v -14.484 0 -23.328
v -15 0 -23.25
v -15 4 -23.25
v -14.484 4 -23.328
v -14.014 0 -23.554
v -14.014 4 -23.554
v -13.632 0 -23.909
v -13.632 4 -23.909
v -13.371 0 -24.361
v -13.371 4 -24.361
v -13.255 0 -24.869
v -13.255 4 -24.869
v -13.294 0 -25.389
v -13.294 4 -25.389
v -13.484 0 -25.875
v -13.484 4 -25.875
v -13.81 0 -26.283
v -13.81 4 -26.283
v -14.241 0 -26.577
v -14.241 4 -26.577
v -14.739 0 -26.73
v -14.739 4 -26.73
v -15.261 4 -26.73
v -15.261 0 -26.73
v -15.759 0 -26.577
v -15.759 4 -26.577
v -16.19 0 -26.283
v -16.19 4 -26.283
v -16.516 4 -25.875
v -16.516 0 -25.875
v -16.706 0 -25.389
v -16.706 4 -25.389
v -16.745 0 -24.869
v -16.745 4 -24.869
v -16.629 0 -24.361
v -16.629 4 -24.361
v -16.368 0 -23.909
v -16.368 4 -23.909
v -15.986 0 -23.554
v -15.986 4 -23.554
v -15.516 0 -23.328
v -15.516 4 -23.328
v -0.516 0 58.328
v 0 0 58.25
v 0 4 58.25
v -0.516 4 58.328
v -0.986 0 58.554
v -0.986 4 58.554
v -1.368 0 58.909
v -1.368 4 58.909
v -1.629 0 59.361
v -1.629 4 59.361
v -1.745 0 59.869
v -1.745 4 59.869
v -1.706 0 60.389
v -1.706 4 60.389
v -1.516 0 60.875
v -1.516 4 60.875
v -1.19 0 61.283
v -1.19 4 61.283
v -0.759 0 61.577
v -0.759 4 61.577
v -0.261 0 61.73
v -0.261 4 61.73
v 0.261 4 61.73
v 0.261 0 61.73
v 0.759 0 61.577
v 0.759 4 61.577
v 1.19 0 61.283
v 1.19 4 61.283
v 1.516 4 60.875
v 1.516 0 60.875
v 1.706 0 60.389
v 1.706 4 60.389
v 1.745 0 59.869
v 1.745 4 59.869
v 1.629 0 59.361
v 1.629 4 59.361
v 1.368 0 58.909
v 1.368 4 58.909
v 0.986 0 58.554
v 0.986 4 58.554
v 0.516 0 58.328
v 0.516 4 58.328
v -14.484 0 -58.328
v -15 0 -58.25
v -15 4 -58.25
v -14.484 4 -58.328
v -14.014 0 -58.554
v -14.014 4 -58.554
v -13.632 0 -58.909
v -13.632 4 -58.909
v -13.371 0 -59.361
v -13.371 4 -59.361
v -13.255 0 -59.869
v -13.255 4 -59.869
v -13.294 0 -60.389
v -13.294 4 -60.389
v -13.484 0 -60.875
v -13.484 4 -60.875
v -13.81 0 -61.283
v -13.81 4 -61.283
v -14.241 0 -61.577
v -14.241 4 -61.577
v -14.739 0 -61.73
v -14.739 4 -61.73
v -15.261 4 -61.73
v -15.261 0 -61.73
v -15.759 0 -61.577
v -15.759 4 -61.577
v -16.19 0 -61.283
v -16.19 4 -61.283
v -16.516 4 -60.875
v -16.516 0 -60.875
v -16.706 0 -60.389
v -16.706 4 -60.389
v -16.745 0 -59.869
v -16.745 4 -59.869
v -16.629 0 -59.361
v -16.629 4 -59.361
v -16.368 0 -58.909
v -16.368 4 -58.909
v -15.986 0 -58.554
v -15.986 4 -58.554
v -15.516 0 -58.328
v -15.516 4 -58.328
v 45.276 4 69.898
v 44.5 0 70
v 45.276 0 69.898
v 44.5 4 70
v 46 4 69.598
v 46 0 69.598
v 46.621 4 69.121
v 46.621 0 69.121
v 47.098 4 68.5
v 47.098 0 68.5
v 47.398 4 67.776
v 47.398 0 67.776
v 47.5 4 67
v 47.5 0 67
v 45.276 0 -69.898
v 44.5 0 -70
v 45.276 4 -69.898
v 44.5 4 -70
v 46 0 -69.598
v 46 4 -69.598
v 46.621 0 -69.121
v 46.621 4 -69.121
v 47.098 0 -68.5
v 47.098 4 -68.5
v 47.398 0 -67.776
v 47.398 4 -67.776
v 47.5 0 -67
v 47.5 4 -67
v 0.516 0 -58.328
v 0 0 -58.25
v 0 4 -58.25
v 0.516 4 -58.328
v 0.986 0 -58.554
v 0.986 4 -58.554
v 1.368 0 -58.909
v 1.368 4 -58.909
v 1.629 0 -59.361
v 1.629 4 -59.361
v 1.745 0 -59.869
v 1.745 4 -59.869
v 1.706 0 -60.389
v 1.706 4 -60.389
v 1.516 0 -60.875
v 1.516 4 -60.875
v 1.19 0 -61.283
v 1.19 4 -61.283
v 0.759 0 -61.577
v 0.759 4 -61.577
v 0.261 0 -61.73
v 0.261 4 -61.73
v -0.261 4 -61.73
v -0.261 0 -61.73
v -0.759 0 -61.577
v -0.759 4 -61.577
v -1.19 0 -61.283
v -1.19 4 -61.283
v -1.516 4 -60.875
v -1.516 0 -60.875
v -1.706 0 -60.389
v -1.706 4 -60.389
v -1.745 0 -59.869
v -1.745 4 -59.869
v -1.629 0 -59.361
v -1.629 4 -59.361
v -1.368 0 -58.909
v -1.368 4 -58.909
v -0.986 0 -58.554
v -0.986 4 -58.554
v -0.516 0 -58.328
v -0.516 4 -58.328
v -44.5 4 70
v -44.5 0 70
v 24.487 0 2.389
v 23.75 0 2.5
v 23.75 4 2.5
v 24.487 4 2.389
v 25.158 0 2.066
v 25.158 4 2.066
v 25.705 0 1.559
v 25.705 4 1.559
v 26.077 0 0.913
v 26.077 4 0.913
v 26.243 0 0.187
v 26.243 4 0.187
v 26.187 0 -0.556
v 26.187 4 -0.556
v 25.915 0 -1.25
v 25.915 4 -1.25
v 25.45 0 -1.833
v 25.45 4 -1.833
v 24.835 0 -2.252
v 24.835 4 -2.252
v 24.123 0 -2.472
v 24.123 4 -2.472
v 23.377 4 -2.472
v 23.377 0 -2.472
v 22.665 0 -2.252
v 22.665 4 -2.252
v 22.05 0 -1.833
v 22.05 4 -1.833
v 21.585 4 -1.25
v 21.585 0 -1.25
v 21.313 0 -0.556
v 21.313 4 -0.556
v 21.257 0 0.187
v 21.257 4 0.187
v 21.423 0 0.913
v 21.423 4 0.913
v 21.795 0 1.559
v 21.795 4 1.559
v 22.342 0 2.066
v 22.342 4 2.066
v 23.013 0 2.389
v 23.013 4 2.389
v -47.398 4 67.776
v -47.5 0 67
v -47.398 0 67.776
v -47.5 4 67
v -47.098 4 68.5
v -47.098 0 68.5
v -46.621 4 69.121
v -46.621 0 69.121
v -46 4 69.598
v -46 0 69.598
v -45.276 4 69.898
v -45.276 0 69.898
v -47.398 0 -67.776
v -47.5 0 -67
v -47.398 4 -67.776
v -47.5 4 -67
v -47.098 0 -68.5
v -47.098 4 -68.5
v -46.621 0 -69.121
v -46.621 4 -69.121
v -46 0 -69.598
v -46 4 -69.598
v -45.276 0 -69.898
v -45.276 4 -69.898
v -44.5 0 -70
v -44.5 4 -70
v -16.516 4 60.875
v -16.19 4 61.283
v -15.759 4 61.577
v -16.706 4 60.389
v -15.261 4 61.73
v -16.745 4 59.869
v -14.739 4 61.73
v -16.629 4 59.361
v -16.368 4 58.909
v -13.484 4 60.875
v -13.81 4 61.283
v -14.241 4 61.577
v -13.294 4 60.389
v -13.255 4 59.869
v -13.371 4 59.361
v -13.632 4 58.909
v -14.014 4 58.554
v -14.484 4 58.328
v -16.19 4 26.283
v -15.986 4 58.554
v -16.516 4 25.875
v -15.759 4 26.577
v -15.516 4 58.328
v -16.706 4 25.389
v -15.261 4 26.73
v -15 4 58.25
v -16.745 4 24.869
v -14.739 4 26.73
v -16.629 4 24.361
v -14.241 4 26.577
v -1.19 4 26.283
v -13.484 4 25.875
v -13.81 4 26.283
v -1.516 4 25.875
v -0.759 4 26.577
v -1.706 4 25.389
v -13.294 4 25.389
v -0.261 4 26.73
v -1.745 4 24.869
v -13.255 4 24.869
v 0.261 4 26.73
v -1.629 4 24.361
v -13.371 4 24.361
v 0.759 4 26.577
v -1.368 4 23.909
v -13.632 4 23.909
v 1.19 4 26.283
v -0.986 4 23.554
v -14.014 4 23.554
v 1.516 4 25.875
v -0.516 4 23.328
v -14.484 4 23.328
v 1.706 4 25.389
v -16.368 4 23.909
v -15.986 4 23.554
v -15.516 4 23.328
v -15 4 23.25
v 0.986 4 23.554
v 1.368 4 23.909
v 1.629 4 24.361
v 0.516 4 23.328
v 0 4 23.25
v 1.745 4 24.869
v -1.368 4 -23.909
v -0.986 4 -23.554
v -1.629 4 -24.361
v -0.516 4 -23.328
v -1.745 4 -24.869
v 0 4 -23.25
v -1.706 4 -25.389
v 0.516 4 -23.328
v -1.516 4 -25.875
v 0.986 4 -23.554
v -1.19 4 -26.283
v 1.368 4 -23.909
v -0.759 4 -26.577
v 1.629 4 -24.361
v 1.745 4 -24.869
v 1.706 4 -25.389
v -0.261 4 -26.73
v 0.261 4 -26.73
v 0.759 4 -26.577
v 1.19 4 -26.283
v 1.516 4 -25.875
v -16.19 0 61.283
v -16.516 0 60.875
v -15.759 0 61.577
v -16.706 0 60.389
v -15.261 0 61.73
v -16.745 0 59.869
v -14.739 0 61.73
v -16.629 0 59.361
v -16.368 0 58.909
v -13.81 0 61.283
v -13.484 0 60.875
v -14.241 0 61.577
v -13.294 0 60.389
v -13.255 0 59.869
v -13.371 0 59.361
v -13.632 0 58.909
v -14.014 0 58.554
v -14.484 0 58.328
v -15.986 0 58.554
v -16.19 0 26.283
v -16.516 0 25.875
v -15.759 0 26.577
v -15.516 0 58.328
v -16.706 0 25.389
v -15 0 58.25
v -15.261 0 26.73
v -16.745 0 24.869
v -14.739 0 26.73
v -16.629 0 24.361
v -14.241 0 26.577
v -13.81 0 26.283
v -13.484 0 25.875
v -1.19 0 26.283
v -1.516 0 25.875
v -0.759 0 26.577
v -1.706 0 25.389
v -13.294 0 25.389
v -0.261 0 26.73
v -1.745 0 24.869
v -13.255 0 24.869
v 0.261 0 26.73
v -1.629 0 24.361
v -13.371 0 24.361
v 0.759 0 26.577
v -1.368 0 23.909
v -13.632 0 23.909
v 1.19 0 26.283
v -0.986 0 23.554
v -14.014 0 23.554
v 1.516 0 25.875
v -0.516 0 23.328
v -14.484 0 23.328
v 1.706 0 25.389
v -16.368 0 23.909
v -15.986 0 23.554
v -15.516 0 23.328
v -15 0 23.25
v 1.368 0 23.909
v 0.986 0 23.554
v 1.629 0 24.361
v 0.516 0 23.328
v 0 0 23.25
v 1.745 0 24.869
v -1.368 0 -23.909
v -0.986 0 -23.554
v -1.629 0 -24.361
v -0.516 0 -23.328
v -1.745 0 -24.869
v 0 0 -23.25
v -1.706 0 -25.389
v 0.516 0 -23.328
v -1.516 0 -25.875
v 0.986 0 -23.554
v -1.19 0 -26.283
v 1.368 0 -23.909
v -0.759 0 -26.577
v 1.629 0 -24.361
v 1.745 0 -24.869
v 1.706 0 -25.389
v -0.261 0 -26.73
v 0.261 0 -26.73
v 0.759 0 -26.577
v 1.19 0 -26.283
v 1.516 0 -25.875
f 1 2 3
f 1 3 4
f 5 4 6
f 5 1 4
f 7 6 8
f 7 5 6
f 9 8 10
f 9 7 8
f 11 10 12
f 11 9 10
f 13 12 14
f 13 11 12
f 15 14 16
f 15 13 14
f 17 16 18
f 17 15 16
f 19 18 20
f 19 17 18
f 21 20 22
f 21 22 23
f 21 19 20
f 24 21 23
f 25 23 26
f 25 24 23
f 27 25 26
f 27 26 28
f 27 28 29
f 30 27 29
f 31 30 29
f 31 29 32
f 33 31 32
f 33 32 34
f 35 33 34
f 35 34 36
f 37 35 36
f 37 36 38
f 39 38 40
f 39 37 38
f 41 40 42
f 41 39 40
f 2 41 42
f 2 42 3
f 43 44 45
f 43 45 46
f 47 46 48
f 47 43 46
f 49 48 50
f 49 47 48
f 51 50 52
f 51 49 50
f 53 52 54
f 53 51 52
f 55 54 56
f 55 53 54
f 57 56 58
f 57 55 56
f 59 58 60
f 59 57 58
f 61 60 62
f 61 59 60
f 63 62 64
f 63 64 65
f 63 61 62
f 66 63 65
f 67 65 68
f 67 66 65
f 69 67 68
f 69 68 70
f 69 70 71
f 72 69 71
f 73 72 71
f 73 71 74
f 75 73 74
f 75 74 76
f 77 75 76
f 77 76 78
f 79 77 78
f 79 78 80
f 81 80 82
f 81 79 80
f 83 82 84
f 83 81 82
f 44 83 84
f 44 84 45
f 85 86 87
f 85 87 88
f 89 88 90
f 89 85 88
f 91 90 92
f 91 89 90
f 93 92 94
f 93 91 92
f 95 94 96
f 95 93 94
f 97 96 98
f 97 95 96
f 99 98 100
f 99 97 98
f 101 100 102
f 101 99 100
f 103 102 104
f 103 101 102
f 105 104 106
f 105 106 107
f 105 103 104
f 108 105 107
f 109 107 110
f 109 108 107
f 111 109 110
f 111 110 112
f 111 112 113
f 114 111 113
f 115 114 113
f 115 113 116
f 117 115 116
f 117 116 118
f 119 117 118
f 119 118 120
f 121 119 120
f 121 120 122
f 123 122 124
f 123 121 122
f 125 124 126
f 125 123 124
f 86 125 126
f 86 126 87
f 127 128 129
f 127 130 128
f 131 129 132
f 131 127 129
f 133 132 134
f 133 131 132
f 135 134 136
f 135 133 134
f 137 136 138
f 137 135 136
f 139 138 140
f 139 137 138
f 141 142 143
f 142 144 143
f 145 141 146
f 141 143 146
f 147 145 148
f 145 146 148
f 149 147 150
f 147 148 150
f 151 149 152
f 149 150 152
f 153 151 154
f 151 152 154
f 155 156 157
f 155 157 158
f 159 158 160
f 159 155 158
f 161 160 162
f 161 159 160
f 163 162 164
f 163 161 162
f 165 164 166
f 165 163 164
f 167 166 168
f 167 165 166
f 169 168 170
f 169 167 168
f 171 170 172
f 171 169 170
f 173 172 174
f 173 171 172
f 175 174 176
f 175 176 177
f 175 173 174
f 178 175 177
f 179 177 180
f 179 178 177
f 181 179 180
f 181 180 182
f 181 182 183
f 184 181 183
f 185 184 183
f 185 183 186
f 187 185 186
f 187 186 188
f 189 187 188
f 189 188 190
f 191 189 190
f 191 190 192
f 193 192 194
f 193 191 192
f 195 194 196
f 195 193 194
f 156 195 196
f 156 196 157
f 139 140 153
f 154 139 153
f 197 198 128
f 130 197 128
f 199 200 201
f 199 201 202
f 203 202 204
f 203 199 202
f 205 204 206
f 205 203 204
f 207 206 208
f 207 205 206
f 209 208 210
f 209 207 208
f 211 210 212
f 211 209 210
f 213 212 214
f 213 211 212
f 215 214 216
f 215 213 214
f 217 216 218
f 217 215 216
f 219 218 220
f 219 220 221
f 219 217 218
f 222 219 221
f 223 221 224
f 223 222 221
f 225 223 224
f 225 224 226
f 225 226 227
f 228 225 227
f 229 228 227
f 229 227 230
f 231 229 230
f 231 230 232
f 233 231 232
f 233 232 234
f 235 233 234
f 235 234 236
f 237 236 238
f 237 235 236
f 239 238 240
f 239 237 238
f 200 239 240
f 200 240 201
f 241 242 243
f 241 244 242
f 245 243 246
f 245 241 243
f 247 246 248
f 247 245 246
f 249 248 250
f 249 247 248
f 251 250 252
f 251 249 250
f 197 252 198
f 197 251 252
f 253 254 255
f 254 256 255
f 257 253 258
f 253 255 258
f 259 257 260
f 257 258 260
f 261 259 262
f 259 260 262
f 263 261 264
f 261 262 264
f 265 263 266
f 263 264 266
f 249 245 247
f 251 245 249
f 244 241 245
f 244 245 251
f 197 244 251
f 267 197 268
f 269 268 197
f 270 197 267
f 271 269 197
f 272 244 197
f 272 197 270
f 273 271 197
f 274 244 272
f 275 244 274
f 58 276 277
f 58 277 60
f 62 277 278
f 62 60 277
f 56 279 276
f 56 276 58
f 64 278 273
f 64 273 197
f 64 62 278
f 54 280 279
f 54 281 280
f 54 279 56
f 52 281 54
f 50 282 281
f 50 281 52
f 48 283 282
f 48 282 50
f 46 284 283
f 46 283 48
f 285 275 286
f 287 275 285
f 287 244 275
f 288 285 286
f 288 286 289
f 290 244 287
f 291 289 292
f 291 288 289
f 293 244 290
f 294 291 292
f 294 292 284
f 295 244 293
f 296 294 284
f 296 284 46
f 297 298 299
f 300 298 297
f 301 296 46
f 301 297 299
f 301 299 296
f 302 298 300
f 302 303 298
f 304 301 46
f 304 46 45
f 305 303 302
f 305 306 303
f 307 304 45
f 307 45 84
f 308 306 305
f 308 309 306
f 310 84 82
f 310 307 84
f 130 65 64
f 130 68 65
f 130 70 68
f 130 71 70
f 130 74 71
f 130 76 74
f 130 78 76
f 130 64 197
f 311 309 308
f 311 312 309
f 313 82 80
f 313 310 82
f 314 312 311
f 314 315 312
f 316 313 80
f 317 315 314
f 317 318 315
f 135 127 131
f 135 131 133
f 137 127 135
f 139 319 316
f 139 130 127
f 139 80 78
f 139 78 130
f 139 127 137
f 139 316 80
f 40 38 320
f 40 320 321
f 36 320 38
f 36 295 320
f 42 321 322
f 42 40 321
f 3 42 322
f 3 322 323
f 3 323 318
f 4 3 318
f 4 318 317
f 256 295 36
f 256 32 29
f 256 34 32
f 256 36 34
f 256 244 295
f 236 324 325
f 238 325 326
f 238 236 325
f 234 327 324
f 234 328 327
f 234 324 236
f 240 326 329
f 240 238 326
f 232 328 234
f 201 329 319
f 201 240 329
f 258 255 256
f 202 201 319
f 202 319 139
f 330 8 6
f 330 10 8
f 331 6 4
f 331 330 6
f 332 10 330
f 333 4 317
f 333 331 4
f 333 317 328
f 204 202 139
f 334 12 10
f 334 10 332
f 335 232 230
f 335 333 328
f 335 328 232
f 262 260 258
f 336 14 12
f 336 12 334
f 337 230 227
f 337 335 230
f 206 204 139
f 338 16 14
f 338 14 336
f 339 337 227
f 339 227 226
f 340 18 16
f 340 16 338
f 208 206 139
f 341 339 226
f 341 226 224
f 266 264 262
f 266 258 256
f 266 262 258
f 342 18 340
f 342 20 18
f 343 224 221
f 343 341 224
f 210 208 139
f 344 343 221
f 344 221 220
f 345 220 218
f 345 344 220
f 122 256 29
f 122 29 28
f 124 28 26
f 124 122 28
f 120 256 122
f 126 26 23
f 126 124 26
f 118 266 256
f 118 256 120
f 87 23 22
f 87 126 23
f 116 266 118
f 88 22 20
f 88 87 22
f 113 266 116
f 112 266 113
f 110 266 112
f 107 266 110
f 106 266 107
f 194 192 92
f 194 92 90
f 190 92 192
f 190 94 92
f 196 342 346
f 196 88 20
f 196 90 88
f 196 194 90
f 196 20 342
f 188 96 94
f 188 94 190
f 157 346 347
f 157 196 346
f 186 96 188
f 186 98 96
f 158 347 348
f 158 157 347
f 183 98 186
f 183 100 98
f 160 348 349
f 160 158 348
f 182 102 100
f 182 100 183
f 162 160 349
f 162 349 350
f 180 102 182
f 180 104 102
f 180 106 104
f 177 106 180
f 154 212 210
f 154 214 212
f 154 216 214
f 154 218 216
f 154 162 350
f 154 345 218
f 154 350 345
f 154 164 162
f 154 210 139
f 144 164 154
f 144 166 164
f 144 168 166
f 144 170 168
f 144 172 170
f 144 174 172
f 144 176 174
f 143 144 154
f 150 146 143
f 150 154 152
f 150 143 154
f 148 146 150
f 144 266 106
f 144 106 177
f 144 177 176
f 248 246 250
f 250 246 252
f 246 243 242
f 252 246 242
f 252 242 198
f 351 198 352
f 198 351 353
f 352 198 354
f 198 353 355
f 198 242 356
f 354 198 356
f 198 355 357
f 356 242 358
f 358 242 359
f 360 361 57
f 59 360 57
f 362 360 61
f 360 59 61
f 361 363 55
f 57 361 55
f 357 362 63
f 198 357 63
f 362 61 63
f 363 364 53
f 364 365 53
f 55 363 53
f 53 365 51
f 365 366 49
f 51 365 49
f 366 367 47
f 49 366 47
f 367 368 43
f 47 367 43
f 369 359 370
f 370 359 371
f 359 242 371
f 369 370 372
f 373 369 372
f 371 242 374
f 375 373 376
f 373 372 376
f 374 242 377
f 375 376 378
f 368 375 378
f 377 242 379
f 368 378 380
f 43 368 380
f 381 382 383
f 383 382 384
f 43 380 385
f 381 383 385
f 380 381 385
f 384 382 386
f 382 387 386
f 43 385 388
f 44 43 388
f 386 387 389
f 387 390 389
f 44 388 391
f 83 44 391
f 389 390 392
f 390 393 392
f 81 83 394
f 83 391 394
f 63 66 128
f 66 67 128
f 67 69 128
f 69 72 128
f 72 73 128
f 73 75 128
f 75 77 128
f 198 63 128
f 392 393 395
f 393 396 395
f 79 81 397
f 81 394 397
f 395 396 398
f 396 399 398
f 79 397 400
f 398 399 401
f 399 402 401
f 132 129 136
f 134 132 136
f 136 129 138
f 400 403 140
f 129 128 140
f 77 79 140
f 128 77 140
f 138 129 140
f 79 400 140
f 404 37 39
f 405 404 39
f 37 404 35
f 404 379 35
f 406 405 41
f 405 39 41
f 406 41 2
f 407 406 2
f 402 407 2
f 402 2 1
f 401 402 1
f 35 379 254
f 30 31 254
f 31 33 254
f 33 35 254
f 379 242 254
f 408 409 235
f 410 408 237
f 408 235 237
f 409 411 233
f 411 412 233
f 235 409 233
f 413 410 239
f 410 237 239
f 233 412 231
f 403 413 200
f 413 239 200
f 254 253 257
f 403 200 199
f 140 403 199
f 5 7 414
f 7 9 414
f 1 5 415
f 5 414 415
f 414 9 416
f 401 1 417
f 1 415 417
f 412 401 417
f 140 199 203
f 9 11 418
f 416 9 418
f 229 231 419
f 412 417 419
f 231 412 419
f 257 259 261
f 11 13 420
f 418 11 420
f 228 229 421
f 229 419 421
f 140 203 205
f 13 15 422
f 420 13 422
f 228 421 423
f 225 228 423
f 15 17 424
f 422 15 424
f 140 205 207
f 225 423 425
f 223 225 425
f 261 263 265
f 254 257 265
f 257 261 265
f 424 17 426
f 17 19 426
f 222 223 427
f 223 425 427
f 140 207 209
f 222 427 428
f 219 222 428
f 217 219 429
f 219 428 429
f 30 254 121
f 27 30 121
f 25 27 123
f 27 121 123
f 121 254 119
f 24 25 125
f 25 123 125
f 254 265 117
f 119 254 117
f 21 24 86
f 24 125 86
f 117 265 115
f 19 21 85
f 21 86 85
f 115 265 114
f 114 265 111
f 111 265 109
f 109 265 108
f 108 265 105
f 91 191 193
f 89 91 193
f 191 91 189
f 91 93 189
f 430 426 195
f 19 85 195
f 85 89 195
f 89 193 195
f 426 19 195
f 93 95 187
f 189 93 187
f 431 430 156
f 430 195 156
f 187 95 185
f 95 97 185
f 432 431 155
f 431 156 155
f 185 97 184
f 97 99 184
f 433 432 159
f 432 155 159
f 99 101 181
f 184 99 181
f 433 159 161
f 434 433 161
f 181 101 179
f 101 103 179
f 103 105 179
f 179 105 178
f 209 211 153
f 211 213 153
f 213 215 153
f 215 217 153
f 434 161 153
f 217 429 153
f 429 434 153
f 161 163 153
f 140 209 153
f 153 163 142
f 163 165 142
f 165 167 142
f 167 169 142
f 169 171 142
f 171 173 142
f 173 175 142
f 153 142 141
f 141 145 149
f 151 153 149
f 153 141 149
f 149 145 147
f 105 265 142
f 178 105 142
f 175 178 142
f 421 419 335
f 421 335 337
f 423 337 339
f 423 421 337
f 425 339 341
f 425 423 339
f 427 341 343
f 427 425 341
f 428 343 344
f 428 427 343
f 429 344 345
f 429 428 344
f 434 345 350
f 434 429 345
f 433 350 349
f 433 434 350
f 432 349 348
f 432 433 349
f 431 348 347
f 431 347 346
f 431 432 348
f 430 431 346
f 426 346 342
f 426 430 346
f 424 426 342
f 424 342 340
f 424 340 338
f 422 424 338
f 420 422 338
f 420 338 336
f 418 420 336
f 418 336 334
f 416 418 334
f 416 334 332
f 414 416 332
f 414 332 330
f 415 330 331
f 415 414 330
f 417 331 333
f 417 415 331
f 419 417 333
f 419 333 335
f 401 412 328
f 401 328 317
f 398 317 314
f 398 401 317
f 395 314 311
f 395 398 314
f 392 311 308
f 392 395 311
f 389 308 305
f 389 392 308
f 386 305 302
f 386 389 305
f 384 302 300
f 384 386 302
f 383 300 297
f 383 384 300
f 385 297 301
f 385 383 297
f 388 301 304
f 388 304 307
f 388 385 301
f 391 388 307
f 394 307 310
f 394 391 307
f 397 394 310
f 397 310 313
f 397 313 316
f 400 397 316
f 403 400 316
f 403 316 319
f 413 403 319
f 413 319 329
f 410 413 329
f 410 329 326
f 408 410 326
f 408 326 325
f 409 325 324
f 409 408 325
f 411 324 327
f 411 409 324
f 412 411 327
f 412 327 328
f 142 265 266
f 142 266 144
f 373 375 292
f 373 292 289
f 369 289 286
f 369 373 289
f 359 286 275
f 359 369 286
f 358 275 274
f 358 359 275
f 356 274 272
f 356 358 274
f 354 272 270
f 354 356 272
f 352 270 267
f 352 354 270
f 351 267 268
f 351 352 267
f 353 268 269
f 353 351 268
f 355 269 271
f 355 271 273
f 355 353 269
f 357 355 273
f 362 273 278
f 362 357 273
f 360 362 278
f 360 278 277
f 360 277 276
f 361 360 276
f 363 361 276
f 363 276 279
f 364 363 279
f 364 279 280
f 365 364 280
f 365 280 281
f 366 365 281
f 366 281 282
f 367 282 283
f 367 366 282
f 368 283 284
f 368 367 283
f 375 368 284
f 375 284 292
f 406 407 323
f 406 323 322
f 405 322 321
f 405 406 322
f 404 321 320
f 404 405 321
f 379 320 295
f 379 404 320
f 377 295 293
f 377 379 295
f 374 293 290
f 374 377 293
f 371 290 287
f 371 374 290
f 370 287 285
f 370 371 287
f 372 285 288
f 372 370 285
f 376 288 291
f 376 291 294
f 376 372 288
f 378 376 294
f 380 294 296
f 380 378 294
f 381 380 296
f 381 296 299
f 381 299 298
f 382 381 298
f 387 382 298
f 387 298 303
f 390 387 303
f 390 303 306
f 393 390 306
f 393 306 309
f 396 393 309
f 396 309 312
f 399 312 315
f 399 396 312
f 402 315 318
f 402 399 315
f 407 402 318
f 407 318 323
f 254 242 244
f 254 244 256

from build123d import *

# Parameters (mm, degrees)
SKETCH1_W           = 95
SKETCH1_H           = 140
SKETCH1_R           = 1.75
SKETCH1_R_2         = 2.5
BOSS_EXTRUDE1_DEPTH = 4
FILLET1_R           = 3


with BuildPart() as part:
    # Sketch1 → Boss-Extrude1 (new body)
    with BuildSketch(Plane(origin=(0, 0, 0), x_dir=(1, 0, 0), z_dir=(0, 1, 0))):
        Rectangle(SKETCH1_W, SKETCH1_H)
        with Locations(Location((0, 60, 0), (0, 0, 270))):
            Circle(SKETCH1_R, mode=Mode.SUBTRACT)
        with Locations(Location((0, 25, 0), (0, 0, 270))):
            Circle(SKETCH1_R, mode=Mode.SUBTRACT)
        with Locations(Location((0, -25, 0), (0, 0, 90))):
            Circle(SKETCH1_R, mode=Mode.SUBTRACT)
        with Locations(Location((0, -60, 0), (0, 0, 90))):
            Circle(SKETCH1_R, mode=Mode.SUBTRACT)
        with Locations(Location((-15, 60, 0), (0, 0, 270))):
            Circle(SKETCH1_R, mode=Mode.SUBTRACT)
        with Locations(Location((-15, 25, 0), (0, 0, 270))):
            Circle(SKETCH1_R, mode=Mode.SUBTRACT)
        with Locations(Location((-15, -25, 0), (0, 0, 90))):
            Circle(SKETCH1_R, mode=Mode.SUBTRACT)
        with Locations(Location((-15, -60, 0), (0, 0, 90))):
            Circle(SKETCH1_R, mode=Mode.SUBTRACT)
        with Locations(Location((23.75, 0, 0), (0, 0, 270))):
            Circle(SKETCH1_R_2, mode=Mode.SUBTRACT)
    extrude(amount=BOSS_EXTRUDE1_DEPTH)

    # Fillet1
    fillet1_edges = [part.edges().sort_by_distance(p)[0] for p in [
        (47.5, 2, 70),
        (-47.5, 2, 70),
        (-47.5, 2, -70),
        (47.5, 2, -70),
    ]]
    fillet(fillet1_edges, radius=FILLET1_R)


solid = part.part
